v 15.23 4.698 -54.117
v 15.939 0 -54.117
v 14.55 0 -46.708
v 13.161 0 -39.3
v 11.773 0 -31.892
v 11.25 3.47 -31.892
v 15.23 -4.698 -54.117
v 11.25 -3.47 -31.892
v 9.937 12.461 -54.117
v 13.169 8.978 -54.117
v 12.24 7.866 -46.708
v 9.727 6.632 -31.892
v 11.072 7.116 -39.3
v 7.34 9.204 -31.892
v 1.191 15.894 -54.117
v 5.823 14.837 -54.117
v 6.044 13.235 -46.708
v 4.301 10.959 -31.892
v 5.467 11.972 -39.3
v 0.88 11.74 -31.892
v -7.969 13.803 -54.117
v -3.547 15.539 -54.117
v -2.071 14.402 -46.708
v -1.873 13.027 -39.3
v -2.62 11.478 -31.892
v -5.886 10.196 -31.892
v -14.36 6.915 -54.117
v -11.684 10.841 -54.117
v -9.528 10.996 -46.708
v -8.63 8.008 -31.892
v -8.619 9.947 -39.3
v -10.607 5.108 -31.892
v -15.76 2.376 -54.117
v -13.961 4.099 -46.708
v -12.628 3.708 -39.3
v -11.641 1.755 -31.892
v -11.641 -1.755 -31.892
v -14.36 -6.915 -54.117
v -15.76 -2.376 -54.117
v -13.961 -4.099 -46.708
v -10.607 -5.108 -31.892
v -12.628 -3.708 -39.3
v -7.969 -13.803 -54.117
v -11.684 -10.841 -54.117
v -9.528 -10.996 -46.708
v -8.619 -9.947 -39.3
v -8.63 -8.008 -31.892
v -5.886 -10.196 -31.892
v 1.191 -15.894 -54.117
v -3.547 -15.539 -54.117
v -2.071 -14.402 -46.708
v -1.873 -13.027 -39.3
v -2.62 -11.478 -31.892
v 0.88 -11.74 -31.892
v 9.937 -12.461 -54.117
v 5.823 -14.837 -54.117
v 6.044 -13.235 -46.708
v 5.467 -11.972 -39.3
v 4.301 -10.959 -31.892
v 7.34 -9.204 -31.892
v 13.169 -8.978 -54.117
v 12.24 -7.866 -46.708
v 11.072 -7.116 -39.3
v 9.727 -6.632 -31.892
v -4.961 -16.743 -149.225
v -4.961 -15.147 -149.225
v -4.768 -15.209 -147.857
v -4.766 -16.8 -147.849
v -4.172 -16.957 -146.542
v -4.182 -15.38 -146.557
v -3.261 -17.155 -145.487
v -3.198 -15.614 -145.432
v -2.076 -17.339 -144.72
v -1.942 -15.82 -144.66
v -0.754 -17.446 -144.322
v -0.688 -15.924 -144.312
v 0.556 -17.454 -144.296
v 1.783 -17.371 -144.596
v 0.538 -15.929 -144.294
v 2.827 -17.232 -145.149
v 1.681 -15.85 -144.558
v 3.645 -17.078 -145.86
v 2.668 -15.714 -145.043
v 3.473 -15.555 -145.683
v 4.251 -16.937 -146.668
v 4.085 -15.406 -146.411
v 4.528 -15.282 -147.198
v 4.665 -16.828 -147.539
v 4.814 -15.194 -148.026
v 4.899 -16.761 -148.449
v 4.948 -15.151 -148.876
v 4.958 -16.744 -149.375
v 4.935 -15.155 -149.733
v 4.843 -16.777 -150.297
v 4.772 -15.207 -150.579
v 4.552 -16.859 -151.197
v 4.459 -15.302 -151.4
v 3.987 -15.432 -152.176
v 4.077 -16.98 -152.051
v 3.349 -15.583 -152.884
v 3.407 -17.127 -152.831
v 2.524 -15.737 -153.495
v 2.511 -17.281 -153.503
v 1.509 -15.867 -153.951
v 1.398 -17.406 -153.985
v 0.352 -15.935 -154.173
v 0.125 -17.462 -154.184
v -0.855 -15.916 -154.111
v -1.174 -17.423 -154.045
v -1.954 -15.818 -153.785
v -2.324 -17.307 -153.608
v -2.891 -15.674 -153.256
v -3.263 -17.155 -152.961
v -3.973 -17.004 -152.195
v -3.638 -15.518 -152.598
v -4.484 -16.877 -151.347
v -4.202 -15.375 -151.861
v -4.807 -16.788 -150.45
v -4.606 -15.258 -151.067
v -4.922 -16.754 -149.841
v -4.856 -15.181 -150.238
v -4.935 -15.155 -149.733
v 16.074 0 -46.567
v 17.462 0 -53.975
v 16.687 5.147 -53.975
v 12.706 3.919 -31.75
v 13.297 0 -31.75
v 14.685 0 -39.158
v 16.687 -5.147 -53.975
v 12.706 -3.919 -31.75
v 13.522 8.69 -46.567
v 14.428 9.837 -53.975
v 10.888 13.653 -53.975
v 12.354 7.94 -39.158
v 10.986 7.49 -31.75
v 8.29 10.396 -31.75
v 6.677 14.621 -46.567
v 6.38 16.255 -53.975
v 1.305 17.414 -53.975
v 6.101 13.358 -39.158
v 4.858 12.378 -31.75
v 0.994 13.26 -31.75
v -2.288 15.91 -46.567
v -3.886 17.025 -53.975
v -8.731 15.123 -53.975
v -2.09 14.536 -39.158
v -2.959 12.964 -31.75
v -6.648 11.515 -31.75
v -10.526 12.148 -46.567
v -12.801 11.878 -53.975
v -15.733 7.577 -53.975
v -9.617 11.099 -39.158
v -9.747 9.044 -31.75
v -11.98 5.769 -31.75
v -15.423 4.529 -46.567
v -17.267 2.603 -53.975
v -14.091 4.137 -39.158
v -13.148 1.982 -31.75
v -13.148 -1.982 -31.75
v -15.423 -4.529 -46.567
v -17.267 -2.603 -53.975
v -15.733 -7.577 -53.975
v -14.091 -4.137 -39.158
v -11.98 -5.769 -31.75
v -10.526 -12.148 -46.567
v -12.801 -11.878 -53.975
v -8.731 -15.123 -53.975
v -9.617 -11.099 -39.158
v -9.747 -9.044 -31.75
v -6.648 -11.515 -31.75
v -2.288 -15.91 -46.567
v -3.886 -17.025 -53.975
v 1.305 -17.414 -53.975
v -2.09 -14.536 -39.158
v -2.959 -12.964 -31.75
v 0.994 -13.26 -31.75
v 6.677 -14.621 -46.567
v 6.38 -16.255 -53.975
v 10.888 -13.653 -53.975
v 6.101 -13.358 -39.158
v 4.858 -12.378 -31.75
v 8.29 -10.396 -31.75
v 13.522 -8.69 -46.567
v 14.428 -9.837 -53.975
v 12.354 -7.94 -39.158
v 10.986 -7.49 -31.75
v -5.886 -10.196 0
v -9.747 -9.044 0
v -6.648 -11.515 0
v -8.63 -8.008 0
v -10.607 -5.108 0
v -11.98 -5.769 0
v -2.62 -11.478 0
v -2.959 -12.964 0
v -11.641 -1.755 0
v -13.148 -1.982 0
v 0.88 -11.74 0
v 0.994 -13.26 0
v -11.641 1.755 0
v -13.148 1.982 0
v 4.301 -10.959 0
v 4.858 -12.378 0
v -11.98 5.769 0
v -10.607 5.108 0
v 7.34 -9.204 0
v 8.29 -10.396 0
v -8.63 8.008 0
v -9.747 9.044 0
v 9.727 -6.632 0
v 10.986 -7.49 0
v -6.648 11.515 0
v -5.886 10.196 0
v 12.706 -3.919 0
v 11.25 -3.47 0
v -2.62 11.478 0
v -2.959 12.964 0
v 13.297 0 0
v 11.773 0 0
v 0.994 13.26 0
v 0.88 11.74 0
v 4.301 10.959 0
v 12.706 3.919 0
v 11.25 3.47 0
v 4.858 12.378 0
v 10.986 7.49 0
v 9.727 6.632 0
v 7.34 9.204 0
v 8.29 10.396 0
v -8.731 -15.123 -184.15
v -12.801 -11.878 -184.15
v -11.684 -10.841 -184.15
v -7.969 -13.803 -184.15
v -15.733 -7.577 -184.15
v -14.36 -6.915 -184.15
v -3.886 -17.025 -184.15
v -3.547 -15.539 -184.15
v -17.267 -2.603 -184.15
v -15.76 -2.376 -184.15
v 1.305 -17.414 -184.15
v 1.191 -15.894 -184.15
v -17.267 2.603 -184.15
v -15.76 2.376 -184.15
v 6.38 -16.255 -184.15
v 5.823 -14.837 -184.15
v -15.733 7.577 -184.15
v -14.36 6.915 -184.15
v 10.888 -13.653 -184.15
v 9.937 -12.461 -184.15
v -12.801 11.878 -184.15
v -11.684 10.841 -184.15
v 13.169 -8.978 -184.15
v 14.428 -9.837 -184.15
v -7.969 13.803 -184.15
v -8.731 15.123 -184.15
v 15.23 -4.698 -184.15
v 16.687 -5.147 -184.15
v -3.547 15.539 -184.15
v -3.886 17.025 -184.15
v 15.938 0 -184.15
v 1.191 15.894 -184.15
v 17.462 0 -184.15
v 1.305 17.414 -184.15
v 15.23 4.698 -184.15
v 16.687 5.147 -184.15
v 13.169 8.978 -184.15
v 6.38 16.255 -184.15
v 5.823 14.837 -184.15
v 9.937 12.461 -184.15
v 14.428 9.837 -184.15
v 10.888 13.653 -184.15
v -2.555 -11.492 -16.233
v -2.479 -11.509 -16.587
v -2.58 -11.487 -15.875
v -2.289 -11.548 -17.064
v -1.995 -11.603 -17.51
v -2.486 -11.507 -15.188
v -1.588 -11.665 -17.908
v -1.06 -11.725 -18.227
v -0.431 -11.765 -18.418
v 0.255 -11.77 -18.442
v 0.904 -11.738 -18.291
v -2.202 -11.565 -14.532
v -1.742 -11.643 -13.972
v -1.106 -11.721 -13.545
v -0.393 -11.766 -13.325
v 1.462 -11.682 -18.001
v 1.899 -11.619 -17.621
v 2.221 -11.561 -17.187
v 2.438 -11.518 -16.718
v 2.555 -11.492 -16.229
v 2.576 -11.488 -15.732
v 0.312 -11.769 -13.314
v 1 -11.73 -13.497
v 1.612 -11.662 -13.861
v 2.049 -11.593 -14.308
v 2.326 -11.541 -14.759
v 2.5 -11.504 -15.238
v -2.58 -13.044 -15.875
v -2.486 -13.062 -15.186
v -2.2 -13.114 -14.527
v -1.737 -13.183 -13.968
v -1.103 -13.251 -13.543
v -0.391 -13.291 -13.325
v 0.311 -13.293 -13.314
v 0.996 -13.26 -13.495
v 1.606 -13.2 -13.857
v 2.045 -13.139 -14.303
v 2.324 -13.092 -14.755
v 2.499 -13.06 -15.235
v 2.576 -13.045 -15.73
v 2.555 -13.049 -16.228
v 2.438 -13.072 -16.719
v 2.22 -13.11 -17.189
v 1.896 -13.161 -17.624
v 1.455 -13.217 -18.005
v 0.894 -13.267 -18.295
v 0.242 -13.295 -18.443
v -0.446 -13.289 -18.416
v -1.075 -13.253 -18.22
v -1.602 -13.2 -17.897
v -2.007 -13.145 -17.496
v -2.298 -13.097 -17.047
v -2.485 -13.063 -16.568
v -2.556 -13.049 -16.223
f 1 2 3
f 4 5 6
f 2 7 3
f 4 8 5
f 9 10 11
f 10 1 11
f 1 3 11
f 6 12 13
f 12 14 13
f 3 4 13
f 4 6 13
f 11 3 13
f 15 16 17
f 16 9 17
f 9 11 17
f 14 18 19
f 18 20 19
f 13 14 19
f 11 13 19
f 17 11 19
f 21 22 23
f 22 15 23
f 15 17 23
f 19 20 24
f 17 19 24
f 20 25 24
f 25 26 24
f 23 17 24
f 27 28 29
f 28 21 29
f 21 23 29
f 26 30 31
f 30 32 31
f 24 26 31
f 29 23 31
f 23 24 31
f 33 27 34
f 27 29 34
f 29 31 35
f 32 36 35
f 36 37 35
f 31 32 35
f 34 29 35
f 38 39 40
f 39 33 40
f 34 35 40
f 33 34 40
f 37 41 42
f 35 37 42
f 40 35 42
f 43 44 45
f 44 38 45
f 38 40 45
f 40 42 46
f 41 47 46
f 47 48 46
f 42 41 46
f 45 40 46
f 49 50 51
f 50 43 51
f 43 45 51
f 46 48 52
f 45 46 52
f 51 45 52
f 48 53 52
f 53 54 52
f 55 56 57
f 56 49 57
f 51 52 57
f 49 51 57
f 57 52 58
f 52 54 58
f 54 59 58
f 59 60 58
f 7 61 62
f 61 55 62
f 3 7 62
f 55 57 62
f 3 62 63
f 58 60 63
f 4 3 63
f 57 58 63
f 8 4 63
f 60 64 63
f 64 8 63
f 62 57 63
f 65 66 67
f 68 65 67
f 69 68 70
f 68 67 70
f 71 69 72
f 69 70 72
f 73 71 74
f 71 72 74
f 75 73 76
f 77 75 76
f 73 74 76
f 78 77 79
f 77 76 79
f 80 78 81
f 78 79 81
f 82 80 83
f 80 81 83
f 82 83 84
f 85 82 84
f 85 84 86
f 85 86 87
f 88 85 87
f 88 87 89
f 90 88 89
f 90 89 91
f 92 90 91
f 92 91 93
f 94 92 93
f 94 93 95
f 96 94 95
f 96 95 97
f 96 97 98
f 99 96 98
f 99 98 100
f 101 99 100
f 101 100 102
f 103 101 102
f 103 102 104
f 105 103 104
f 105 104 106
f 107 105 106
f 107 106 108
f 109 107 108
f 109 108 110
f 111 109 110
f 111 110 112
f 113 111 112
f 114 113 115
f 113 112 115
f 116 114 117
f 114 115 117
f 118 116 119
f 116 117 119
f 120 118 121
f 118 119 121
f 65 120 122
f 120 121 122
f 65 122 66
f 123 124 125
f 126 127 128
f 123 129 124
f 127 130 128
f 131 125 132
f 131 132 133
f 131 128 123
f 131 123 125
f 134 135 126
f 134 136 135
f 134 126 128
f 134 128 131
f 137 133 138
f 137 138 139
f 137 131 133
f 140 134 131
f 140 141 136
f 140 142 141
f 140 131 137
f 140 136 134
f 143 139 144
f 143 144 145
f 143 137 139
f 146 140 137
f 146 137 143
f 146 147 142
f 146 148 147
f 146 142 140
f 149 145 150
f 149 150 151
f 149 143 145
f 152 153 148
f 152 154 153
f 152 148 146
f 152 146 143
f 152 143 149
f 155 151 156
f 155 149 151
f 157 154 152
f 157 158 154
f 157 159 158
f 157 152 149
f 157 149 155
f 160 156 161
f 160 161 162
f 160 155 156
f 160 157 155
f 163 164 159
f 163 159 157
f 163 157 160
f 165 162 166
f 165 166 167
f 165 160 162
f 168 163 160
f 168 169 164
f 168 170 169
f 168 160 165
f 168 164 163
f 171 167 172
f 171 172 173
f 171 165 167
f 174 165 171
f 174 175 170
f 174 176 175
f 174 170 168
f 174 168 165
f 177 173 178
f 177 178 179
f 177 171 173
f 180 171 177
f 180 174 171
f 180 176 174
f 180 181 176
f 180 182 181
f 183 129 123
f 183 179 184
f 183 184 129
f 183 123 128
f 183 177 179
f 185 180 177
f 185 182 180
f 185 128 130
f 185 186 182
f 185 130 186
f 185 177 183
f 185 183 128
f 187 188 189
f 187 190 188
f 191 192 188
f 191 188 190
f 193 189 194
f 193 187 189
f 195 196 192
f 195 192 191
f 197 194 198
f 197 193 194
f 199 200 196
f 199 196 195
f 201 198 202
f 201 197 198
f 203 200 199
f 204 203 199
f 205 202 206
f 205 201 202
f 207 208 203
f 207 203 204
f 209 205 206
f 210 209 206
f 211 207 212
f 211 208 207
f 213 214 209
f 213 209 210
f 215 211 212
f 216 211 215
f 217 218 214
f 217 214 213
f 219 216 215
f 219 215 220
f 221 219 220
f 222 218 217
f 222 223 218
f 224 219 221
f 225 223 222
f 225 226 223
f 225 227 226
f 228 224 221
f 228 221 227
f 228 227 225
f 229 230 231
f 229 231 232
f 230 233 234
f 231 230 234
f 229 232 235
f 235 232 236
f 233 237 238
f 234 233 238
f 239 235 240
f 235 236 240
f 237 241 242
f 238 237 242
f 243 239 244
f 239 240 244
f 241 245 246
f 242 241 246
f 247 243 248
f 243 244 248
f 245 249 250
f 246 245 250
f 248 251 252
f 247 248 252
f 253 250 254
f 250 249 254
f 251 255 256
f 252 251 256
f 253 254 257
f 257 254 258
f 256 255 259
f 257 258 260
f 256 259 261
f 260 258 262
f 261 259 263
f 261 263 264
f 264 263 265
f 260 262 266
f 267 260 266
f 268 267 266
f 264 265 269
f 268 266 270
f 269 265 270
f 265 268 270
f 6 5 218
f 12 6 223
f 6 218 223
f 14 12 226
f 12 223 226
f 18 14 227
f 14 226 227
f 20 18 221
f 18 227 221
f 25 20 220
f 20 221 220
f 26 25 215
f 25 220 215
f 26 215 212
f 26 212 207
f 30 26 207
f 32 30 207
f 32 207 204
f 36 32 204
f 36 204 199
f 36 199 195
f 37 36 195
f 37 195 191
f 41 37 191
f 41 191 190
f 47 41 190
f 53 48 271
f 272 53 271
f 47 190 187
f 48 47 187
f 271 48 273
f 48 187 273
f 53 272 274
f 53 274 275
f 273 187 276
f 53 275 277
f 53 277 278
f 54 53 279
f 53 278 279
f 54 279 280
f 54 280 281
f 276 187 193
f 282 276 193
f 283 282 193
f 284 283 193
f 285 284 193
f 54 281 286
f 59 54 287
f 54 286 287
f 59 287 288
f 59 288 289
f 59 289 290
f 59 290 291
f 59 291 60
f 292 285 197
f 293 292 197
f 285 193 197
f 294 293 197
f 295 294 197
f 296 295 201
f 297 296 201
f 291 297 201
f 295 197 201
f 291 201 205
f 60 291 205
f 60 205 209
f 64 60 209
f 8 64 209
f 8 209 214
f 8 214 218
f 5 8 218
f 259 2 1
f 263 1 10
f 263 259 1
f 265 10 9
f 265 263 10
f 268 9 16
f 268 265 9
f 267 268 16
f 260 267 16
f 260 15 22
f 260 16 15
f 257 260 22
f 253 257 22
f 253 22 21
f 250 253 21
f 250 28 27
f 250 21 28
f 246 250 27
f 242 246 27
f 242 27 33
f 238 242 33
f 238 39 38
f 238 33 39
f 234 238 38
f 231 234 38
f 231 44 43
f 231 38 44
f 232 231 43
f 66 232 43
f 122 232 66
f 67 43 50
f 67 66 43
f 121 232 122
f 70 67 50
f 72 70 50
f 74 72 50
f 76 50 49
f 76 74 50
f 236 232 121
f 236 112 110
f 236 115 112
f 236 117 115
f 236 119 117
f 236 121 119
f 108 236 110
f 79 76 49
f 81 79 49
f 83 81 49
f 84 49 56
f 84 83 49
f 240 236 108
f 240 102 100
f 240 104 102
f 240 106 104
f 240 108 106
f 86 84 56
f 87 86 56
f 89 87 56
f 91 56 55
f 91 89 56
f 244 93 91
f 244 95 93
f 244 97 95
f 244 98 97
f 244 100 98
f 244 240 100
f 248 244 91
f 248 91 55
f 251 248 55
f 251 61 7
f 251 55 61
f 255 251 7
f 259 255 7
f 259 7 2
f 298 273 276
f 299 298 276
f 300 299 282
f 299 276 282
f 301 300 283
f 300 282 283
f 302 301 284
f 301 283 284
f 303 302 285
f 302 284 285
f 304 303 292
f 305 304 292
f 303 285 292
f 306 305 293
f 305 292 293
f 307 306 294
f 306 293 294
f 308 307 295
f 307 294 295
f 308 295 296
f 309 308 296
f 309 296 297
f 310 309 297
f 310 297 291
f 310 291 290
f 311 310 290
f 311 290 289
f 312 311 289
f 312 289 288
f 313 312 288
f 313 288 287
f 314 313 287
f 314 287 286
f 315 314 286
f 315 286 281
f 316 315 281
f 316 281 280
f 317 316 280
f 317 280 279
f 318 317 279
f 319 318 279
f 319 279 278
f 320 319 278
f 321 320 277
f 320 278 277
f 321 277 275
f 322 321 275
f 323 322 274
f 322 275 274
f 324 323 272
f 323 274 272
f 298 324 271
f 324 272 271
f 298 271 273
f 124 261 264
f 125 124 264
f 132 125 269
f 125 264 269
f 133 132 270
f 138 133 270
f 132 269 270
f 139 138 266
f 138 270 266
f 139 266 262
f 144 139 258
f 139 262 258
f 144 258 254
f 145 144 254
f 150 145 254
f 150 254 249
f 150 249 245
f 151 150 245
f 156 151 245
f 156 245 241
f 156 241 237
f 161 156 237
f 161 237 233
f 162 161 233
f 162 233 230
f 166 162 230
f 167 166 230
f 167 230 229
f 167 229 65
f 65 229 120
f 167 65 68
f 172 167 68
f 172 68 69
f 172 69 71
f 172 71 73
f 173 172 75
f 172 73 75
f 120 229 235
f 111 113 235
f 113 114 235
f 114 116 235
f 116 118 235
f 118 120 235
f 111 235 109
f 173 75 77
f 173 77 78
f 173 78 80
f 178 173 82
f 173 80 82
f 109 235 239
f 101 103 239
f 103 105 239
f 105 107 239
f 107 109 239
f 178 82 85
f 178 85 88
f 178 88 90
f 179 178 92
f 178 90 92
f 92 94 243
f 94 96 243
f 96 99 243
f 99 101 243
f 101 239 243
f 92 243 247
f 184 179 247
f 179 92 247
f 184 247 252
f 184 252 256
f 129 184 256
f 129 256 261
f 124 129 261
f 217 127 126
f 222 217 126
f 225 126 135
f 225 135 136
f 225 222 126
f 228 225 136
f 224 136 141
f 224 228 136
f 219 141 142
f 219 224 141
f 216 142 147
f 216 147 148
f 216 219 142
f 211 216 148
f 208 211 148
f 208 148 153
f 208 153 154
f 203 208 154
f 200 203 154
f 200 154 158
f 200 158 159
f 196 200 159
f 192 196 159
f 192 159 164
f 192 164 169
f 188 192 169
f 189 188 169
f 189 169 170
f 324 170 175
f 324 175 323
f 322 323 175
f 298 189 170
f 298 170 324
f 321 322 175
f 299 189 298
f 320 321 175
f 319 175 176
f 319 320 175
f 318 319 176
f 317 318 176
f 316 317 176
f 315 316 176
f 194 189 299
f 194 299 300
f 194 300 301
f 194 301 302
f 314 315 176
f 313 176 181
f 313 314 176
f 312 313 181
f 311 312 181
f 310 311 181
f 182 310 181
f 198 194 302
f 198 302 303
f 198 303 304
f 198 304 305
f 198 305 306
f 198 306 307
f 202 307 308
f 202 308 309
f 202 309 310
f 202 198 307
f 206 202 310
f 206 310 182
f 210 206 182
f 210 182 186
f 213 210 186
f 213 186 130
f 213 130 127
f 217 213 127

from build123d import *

# Parameters (mm, degrees)
F0_R      = 13.2969
F1_DEPTH  = 31.75
F3_R      = 17.4625
F4_DEPTH  = 130.175
F4_FACE_R = 17.4625
F1_FACE_R = 13.2969
F6_T      = -1.524
F12_D     = 9.92124
F12_DEPTH = 6.35
F12_TIP   = 2.980641204
F13_D     = 5.159375
F13_DEPTH = 6.35
F13_TIP   = 1.5500326281


with BuildPart() as f1:
    # F0 (on Top) → F1 (new body)
    with BuildSketch(Plane.XY):
        Circle(F0_R)
    extrude(amount=-F1_DEPTH)



with BuildPart() as f4:
    # F3 (on offset) → F4 (new body)
    with BuildSketch(Plane.XY.offset(-184.15)):
        Circle(F3_R)
    extrude(amount=F4_DEPTH)


with BuildPart() as f1_1:
    add(f1.part)

    add(f4.part)  # F5 merges F4
    # F4_face (on face) → F5 section 0
    with BuildSketch(Plane.XY.offset(-53.975)):
        Circle(F4_FACE_R)
    # F1_face (on face) → F5 section 1
    with BuildSketch(Plane(origin=(0, 0, -31.75), x_dir=(1, 0, 0), z_dir=(0, 0, -1))):
        Circle(F1_FACE_R)
    loft()

    # F6
    f6_openings = [f1_1.faces().sort_by_distance(p)[0] for p in [
        (0, 0, 0),
        (0, 0, -184.15),
    ]]
    offset(amount=F6_T, openings=f6_openings, kind=Kind.INTERSECTION)

    # F12
    with Locations(Plane.XZ.offset(17.4625)):
        with Locations((0, -149.225)):
            Hole(F12_D / 2, depth=F12_DEPTH)
            with Locations((0, 0, -(F12_DEPTH + F12_TIP / 2))):  # 118° drill point
                Cone(0, F12_D / 2, F12_TIP, mode=Mode.SUBTRACT)

    # F13
    with Locations(Plane.XZ.offset(13.2969)):
        with Locations((0, -15.875)):
            Hole(F13_D / 2, depth=F13_DEPTH)
            with Locations((0, 0, -(F13_DEPTH + F13_TIP / 2))):  # 118° drill point
                Cone(0, F13_D / 2, F13_TIP, mode=Mode.SUBTRACT)


solid = f1_1.part
